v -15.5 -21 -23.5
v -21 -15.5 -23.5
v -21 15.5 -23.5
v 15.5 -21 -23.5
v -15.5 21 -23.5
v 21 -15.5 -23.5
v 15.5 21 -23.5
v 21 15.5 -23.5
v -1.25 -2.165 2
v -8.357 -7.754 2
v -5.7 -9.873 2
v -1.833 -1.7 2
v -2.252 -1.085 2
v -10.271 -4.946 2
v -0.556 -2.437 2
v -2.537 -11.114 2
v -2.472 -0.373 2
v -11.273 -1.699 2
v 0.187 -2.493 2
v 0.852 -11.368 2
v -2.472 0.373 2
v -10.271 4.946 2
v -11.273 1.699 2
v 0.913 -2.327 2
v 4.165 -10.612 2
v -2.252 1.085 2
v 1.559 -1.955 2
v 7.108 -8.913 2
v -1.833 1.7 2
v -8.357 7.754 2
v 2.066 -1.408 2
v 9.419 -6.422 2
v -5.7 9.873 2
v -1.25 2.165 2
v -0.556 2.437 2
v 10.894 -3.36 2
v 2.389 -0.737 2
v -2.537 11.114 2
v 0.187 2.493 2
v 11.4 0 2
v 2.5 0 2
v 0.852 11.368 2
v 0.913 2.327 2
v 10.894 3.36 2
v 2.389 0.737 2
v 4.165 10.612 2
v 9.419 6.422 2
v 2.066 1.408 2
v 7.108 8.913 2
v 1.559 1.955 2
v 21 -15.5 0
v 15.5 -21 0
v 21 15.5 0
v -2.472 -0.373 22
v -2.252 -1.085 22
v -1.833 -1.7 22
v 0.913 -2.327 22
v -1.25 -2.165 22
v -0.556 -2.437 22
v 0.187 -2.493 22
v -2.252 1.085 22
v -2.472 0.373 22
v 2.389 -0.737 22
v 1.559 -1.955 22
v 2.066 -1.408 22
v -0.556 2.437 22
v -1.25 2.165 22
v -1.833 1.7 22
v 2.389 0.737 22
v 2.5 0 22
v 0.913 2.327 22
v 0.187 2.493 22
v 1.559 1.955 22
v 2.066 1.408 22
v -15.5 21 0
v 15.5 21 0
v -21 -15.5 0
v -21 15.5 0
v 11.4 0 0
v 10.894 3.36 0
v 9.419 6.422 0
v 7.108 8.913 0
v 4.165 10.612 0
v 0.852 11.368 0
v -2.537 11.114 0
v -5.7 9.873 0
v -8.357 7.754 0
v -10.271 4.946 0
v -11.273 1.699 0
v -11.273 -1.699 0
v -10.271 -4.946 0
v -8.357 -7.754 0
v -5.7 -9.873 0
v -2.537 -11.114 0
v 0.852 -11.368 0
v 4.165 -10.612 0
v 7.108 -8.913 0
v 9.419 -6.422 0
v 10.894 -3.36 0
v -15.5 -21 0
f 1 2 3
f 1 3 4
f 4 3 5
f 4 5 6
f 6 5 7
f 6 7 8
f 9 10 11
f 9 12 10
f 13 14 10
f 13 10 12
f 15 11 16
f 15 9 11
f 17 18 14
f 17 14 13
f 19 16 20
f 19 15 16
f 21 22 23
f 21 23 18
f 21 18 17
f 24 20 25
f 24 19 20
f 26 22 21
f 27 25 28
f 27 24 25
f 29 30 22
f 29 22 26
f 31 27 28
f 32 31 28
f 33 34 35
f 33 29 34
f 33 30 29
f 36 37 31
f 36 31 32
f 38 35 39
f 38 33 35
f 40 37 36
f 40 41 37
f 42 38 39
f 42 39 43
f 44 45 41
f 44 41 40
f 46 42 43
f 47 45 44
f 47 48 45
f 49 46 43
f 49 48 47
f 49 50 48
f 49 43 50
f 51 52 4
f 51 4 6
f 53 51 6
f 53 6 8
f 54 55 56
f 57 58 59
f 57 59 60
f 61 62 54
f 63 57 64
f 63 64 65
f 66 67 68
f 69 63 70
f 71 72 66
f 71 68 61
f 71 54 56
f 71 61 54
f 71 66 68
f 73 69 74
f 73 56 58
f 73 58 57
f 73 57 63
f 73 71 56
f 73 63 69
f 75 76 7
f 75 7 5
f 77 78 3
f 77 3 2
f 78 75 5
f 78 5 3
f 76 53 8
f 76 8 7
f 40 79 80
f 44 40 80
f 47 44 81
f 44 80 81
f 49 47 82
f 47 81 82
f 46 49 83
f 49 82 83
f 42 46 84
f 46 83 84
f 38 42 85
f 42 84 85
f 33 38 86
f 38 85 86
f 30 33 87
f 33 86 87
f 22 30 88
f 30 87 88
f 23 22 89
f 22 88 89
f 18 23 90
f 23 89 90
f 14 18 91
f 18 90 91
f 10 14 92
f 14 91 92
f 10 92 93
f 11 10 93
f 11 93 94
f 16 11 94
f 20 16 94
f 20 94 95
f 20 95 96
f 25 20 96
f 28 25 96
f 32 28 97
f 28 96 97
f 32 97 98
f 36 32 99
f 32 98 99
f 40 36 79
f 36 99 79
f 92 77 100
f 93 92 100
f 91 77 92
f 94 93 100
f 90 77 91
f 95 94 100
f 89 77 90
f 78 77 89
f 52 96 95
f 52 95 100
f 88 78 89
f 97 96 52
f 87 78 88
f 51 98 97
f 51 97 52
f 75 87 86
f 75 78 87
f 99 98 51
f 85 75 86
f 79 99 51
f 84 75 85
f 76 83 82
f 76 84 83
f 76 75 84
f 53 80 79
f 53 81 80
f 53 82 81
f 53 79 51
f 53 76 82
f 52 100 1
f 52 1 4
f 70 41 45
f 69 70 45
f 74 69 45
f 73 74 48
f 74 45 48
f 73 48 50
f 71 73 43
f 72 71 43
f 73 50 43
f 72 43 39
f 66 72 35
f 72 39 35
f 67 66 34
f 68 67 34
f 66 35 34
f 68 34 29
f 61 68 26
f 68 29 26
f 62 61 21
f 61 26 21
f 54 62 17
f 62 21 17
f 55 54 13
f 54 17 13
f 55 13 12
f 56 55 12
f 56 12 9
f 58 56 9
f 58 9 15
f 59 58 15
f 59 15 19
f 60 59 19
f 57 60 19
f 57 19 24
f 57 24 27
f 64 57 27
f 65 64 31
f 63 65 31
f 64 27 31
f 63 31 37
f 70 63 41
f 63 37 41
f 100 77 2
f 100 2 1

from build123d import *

# Parameters (mm, degrees)
PAD043_DEPTH = 23.5
SKETCH047_R  = 11.4
PAD044_DEPTH = 2
SKETCH048_R  = 2.5
PAD045_DEPTH = 20


with BuildPart() as part:
    # Sketch046 → Pad043 (new body)
    with BuildSketch(Plane.XY):
        Polygon((-15.5, 21), (-21, 15.5), (-21, -15.5), (-15.5, -21), (15.5, -21), (21, -15.5), (21, 15.5), (15.5, 21), align=None)
    extrude(amount=-PAD043_DEPTH)

    # Sketch047 (on Face9 of Pad043) → Pad044 (join)
    with BuildSketch(Plane.XY):
        Circle(SKETCH047_R)
    extrude(amount=PAD044_DEPTH)

    # Sketch048 (on Face12 of Pad044) → Pad045 (join)
    with BuildSketch(Plane.XY.offset(2)):
        Circle(SKETCH048_R)
    extrude(amount=PAD045_DEPTH)


solid = part.part
